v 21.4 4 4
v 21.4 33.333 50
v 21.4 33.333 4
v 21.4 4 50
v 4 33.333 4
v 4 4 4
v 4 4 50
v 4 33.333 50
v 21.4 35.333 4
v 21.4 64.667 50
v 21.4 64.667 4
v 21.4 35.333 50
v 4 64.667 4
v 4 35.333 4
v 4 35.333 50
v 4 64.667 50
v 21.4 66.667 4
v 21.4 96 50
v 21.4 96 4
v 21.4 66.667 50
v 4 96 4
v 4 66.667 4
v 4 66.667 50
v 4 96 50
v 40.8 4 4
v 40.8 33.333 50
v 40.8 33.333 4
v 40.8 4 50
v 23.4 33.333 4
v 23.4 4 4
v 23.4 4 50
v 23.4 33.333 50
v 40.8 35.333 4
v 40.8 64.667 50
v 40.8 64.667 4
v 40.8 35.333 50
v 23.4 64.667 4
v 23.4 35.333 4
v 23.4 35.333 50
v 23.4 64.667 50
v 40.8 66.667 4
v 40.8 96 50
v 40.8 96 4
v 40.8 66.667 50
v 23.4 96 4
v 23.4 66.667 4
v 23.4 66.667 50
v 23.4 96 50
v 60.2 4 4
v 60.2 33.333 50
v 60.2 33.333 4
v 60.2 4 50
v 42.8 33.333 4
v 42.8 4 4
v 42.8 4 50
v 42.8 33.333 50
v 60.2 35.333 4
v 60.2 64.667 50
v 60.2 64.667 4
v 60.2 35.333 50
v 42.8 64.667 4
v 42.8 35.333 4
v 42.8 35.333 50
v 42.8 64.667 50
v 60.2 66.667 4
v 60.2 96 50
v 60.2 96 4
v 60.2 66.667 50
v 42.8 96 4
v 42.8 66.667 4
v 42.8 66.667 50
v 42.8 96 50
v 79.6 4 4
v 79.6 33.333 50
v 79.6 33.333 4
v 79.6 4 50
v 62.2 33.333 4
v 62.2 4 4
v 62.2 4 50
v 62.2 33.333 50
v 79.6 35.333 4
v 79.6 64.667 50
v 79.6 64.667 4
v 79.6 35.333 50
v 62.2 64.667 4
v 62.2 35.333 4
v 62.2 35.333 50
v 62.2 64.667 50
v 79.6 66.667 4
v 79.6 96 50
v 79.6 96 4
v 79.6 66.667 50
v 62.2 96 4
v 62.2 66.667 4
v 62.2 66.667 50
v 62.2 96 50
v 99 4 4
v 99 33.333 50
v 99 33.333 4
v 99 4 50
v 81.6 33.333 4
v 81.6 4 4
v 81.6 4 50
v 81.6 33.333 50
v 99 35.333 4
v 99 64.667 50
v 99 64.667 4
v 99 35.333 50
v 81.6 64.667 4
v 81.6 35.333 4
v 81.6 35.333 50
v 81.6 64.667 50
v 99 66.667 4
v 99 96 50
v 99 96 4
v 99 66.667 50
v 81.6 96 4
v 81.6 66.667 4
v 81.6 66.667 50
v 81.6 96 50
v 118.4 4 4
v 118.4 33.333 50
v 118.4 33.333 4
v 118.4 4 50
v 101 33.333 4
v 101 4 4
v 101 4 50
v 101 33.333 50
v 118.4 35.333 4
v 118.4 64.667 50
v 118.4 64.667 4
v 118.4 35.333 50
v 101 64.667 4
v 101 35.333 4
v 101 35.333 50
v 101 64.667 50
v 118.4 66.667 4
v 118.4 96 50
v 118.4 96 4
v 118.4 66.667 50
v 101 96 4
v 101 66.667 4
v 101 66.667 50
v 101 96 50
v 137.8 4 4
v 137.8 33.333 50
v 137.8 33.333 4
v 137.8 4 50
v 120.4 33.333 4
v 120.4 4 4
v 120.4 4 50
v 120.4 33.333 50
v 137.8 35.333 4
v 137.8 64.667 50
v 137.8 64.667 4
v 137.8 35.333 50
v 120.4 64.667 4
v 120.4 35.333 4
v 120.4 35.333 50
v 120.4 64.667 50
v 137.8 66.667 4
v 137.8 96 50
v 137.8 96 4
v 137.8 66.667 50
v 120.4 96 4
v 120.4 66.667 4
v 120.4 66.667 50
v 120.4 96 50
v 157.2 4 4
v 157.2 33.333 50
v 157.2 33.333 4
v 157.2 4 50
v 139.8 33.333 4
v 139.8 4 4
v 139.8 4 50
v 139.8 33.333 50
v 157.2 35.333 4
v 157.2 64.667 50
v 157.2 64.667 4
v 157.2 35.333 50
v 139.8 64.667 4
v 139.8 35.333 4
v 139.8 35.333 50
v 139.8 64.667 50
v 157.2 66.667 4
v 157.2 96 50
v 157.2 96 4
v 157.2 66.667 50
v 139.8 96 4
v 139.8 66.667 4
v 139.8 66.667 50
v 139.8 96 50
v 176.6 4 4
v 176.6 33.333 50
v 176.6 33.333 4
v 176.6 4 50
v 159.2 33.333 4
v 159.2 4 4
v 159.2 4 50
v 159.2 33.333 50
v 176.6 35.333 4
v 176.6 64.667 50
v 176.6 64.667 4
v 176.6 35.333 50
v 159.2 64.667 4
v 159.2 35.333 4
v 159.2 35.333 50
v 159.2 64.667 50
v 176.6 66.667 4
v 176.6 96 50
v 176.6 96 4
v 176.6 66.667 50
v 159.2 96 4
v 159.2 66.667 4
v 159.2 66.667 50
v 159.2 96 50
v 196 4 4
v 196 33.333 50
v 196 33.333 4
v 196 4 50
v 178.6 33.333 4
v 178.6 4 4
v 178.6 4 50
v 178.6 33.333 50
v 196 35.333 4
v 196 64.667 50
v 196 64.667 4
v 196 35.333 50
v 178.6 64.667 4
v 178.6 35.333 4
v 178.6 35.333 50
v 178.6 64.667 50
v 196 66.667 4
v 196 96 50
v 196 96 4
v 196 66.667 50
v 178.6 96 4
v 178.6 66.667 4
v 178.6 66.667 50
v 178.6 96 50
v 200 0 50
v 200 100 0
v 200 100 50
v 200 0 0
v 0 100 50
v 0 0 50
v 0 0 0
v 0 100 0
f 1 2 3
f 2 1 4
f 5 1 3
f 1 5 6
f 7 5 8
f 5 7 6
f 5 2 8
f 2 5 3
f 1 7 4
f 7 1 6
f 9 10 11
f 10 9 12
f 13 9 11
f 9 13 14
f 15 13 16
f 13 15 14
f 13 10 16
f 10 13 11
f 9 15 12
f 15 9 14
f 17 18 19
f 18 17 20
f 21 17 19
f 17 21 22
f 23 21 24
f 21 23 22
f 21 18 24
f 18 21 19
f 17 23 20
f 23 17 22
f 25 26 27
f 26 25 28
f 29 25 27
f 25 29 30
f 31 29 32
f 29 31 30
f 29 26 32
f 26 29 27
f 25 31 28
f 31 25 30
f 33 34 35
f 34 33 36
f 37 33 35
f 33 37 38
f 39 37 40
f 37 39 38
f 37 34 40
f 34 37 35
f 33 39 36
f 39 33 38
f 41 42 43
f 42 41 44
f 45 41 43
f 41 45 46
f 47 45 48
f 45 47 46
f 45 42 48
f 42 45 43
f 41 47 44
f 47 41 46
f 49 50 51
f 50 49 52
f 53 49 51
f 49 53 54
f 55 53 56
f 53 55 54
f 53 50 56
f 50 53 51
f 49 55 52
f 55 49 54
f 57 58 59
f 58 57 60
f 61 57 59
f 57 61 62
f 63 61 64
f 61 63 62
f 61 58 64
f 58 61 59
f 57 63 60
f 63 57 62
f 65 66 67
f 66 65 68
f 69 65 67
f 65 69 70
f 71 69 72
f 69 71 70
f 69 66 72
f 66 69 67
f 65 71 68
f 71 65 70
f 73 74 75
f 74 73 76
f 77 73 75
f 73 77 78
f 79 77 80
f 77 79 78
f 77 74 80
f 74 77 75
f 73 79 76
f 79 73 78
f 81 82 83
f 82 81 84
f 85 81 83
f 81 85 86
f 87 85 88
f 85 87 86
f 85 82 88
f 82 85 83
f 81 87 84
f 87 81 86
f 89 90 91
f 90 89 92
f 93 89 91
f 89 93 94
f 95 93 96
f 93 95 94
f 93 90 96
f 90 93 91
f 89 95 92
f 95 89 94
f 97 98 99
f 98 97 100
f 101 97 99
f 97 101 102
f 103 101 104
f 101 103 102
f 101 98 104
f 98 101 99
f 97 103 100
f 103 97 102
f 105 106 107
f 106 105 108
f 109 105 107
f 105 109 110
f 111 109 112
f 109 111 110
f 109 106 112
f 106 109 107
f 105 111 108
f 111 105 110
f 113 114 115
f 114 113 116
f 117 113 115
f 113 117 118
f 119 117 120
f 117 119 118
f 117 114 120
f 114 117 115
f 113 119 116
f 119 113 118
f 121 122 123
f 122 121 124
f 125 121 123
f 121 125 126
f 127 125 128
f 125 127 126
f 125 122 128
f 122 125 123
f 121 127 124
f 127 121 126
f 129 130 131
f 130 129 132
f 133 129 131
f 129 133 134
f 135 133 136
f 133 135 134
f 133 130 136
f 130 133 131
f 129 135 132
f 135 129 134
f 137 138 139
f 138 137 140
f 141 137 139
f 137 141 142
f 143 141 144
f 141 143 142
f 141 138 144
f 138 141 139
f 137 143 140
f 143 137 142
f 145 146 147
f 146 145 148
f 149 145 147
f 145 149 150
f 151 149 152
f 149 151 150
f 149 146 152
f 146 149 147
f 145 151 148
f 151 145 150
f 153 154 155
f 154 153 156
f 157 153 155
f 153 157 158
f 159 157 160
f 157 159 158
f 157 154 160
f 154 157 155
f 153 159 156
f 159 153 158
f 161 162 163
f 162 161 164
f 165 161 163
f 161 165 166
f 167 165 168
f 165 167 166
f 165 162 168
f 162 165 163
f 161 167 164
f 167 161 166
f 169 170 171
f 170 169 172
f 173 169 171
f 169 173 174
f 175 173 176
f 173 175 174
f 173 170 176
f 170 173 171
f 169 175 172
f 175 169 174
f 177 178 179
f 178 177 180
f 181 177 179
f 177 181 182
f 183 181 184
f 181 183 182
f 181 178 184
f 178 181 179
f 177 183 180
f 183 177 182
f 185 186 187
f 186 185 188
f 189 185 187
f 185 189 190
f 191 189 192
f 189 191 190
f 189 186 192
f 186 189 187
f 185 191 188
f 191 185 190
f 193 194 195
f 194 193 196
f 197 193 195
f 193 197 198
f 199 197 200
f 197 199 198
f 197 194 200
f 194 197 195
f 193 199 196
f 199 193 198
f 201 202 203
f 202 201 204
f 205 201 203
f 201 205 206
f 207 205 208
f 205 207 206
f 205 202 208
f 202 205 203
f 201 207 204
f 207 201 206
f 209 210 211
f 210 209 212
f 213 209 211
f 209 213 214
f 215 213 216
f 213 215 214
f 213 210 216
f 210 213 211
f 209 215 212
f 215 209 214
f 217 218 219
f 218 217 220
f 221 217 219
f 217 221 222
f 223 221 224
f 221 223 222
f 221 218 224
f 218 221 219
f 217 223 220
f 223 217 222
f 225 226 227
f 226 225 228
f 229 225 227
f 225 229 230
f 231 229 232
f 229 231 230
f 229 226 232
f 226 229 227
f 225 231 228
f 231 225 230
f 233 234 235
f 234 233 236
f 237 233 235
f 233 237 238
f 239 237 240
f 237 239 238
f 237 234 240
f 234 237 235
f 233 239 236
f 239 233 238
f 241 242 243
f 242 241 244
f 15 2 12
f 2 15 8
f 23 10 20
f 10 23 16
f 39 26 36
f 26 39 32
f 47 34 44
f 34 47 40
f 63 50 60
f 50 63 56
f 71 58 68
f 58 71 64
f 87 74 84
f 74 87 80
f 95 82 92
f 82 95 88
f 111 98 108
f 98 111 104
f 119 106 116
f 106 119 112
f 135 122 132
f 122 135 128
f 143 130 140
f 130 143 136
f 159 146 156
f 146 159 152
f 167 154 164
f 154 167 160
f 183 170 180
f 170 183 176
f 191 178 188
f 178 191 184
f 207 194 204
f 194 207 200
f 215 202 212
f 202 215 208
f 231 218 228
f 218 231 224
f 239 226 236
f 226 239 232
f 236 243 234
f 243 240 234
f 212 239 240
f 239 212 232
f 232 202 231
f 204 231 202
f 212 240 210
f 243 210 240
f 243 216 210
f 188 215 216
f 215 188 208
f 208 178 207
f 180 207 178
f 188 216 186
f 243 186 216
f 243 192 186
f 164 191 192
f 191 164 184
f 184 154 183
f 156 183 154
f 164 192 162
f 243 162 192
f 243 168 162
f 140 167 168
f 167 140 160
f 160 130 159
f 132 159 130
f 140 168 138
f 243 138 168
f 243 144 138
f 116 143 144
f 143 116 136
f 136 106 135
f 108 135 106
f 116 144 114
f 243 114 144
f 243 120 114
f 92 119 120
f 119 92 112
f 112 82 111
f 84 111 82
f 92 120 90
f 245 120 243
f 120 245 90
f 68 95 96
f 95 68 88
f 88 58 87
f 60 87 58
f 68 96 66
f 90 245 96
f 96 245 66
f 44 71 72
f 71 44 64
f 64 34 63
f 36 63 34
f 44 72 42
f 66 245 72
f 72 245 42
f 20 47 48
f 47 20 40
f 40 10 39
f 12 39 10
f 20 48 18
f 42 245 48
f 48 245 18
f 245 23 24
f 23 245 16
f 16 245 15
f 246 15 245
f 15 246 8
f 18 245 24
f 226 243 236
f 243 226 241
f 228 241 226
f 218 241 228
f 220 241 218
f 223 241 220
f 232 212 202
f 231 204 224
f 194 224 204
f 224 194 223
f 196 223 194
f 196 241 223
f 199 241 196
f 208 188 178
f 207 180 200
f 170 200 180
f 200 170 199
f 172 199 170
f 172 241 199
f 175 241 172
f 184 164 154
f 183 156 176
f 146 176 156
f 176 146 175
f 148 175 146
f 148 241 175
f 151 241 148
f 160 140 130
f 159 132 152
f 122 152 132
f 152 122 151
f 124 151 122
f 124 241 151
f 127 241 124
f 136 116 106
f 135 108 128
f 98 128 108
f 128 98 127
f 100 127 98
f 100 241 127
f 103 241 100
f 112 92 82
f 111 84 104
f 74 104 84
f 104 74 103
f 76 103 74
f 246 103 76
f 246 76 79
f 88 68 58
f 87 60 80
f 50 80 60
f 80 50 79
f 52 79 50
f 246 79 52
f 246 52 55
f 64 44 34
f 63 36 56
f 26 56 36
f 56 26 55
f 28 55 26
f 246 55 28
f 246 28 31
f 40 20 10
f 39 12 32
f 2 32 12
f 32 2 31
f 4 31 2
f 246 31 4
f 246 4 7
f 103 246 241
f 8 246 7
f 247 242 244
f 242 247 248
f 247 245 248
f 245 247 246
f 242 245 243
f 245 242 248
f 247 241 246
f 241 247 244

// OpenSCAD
/* [Box dimensions] */
// External length (X)
lg = 200;
// External width (Y)
wd = 100;
// External heigth (Z)
ht = 50;

/* [Thickness] */
// External thickness
extTk = 4;
// Internal thickness
intTk = 2;

/* [Dividers] */
// Number divider on axe X
divX = 10;
// Number divider on axe Y
divY = 3;

module box(lg, wd, ht, extTk, intTk, divX, divY)
{
    difference()
    {
        // External box
        cube([lg,wd,ht]);
        
        // Internal length (X)
        sizeX = (lg - extTk*2 - intTk*(divX-1))/divX;
        // Internal width (Y)
        sizeY = (wd - extTk*2 - intTk*(divY-1))/divY;
        // Internal heigth (Z)
        sizeZ = ht - extTk + 0.1;
        
        // Holes
        for (vX=[0:divX-1], vY=[0:divY-1])
            translate([extTk+vX*(sizeX+intTk),extTk+vY*(sizeY+intTk),extTk])
            cube([sizeX, sizeY, sizeZ]);
    }
}

box(lg=lg, wd=wd, ht=ht, extTk=extTk, intTk=intTk, divX=divX, divY=divY);
